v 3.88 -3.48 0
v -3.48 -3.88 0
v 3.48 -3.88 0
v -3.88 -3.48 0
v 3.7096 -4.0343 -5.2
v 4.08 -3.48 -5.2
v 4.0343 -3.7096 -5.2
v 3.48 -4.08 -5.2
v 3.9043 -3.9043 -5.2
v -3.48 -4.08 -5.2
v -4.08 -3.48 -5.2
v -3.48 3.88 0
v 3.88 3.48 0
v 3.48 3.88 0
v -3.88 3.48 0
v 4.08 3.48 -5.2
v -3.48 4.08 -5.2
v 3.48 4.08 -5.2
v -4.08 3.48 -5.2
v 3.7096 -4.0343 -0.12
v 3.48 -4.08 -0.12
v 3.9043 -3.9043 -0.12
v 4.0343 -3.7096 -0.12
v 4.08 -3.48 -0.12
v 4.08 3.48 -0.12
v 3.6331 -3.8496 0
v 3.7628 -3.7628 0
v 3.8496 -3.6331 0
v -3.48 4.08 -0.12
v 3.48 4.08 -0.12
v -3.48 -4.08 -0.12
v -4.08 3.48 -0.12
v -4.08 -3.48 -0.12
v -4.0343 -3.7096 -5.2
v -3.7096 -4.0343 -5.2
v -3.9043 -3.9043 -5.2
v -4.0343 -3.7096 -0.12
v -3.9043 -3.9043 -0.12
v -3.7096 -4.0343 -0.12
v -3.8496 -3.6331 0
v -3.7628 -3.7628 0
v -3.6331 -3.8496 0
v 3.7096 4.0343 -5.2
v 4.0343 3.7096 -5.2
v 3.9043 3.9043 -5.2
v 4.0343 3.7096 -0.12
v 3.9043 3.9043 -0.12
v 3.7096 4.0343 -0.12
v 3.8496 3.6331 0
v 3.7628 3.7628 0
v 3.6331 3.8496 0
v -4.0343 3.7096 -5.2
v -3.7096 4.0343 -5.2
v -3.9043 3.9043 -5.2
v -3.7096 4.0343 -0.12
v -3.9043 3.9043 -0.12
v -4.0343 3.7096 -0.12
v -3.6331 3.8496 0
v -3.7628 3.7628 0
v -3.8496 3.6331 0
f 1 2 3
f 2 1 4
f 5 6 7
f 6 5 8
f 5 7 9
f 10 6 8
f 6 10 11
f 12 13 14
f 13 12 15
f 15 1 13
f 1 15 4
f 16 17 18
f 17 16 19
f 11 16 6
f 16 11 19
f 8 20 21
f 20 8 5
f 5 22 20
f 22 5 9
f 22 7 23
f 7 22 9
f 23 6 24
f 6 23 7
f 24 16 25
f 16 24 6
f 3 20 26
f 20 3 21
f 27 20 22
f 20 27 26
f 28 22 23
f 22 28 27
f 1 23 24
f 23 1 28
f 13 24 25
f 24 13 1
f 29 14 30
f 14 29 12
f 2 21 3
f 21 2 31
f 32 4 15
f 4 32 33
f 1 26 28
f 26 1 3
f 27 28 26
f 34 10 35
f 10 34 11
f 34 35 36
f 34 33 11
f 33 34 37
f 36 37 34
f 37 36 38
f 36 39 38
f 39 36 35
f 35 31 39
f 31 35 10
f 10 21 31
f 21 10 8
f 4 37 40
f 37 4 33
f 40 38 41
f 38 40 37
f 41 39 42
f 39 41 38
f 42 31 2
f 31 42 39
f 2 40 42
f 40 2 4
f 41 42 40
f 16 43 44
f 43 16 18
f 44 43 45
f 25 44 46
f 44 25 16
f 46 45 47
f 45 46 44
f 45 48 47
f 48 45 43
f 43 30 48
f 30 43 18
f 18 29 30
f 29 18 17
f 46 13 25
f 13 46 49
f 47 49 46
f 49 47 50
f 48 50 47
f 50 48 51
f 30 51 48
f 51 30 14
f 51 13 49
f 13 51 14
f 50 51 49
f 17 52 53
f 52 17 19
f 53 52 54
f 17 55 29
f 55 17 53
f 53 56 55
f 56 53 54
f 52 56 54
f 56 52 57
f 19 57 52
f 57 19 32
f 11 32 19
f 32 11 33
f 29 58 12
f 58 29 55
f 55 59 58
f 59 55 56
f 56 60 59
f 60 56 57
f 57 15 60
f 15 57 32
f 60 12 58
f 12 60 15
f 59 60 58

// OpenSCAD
use <../lib.scad>
use <99146.scad>
$fa=1; $fs=0.2;
function ldraw_lib__35536(realsolid=false) = [
// 0 ~Electric Powered Up Remote Handset On Button
// 0 Name: 35536.dat
// 0 Author: Philippe Hurbain [Philo]
// 0 !LDRAW_ORG Part UPDATE 2020-01
// 0 !LICENSE Licensed under CC BY 2.0 and CC BY 4.0 : see CAreadme.txt
// 
// 0 BFC CERTIFY CCW
  [0,"BFC","CERTIFY"],
  [0,"BFC","CCW"],
// 
// 0 !HISTORY 2020-06-28 [PTadmin] Official Update 2020-01
// 
// 
// 1 16 0 0 0 1 0 0 0 1 0 0 0 1 99146.dat
  [1,16,0,0,0,1,0,0,0,1,0,0,0,1, ldraw_lib__99146(realsolid)],
];
module ldraw_lib__35536(step=0, col=false, unit=2/5, alt=false, line=0.2, solid=!$preview)
    makepoly(ldraw_lib__35536(solid), step=step, col=col, unit=unit, alt=alt, line=line, solid=solid);
ldraw_lib__35536(line=0.2);
